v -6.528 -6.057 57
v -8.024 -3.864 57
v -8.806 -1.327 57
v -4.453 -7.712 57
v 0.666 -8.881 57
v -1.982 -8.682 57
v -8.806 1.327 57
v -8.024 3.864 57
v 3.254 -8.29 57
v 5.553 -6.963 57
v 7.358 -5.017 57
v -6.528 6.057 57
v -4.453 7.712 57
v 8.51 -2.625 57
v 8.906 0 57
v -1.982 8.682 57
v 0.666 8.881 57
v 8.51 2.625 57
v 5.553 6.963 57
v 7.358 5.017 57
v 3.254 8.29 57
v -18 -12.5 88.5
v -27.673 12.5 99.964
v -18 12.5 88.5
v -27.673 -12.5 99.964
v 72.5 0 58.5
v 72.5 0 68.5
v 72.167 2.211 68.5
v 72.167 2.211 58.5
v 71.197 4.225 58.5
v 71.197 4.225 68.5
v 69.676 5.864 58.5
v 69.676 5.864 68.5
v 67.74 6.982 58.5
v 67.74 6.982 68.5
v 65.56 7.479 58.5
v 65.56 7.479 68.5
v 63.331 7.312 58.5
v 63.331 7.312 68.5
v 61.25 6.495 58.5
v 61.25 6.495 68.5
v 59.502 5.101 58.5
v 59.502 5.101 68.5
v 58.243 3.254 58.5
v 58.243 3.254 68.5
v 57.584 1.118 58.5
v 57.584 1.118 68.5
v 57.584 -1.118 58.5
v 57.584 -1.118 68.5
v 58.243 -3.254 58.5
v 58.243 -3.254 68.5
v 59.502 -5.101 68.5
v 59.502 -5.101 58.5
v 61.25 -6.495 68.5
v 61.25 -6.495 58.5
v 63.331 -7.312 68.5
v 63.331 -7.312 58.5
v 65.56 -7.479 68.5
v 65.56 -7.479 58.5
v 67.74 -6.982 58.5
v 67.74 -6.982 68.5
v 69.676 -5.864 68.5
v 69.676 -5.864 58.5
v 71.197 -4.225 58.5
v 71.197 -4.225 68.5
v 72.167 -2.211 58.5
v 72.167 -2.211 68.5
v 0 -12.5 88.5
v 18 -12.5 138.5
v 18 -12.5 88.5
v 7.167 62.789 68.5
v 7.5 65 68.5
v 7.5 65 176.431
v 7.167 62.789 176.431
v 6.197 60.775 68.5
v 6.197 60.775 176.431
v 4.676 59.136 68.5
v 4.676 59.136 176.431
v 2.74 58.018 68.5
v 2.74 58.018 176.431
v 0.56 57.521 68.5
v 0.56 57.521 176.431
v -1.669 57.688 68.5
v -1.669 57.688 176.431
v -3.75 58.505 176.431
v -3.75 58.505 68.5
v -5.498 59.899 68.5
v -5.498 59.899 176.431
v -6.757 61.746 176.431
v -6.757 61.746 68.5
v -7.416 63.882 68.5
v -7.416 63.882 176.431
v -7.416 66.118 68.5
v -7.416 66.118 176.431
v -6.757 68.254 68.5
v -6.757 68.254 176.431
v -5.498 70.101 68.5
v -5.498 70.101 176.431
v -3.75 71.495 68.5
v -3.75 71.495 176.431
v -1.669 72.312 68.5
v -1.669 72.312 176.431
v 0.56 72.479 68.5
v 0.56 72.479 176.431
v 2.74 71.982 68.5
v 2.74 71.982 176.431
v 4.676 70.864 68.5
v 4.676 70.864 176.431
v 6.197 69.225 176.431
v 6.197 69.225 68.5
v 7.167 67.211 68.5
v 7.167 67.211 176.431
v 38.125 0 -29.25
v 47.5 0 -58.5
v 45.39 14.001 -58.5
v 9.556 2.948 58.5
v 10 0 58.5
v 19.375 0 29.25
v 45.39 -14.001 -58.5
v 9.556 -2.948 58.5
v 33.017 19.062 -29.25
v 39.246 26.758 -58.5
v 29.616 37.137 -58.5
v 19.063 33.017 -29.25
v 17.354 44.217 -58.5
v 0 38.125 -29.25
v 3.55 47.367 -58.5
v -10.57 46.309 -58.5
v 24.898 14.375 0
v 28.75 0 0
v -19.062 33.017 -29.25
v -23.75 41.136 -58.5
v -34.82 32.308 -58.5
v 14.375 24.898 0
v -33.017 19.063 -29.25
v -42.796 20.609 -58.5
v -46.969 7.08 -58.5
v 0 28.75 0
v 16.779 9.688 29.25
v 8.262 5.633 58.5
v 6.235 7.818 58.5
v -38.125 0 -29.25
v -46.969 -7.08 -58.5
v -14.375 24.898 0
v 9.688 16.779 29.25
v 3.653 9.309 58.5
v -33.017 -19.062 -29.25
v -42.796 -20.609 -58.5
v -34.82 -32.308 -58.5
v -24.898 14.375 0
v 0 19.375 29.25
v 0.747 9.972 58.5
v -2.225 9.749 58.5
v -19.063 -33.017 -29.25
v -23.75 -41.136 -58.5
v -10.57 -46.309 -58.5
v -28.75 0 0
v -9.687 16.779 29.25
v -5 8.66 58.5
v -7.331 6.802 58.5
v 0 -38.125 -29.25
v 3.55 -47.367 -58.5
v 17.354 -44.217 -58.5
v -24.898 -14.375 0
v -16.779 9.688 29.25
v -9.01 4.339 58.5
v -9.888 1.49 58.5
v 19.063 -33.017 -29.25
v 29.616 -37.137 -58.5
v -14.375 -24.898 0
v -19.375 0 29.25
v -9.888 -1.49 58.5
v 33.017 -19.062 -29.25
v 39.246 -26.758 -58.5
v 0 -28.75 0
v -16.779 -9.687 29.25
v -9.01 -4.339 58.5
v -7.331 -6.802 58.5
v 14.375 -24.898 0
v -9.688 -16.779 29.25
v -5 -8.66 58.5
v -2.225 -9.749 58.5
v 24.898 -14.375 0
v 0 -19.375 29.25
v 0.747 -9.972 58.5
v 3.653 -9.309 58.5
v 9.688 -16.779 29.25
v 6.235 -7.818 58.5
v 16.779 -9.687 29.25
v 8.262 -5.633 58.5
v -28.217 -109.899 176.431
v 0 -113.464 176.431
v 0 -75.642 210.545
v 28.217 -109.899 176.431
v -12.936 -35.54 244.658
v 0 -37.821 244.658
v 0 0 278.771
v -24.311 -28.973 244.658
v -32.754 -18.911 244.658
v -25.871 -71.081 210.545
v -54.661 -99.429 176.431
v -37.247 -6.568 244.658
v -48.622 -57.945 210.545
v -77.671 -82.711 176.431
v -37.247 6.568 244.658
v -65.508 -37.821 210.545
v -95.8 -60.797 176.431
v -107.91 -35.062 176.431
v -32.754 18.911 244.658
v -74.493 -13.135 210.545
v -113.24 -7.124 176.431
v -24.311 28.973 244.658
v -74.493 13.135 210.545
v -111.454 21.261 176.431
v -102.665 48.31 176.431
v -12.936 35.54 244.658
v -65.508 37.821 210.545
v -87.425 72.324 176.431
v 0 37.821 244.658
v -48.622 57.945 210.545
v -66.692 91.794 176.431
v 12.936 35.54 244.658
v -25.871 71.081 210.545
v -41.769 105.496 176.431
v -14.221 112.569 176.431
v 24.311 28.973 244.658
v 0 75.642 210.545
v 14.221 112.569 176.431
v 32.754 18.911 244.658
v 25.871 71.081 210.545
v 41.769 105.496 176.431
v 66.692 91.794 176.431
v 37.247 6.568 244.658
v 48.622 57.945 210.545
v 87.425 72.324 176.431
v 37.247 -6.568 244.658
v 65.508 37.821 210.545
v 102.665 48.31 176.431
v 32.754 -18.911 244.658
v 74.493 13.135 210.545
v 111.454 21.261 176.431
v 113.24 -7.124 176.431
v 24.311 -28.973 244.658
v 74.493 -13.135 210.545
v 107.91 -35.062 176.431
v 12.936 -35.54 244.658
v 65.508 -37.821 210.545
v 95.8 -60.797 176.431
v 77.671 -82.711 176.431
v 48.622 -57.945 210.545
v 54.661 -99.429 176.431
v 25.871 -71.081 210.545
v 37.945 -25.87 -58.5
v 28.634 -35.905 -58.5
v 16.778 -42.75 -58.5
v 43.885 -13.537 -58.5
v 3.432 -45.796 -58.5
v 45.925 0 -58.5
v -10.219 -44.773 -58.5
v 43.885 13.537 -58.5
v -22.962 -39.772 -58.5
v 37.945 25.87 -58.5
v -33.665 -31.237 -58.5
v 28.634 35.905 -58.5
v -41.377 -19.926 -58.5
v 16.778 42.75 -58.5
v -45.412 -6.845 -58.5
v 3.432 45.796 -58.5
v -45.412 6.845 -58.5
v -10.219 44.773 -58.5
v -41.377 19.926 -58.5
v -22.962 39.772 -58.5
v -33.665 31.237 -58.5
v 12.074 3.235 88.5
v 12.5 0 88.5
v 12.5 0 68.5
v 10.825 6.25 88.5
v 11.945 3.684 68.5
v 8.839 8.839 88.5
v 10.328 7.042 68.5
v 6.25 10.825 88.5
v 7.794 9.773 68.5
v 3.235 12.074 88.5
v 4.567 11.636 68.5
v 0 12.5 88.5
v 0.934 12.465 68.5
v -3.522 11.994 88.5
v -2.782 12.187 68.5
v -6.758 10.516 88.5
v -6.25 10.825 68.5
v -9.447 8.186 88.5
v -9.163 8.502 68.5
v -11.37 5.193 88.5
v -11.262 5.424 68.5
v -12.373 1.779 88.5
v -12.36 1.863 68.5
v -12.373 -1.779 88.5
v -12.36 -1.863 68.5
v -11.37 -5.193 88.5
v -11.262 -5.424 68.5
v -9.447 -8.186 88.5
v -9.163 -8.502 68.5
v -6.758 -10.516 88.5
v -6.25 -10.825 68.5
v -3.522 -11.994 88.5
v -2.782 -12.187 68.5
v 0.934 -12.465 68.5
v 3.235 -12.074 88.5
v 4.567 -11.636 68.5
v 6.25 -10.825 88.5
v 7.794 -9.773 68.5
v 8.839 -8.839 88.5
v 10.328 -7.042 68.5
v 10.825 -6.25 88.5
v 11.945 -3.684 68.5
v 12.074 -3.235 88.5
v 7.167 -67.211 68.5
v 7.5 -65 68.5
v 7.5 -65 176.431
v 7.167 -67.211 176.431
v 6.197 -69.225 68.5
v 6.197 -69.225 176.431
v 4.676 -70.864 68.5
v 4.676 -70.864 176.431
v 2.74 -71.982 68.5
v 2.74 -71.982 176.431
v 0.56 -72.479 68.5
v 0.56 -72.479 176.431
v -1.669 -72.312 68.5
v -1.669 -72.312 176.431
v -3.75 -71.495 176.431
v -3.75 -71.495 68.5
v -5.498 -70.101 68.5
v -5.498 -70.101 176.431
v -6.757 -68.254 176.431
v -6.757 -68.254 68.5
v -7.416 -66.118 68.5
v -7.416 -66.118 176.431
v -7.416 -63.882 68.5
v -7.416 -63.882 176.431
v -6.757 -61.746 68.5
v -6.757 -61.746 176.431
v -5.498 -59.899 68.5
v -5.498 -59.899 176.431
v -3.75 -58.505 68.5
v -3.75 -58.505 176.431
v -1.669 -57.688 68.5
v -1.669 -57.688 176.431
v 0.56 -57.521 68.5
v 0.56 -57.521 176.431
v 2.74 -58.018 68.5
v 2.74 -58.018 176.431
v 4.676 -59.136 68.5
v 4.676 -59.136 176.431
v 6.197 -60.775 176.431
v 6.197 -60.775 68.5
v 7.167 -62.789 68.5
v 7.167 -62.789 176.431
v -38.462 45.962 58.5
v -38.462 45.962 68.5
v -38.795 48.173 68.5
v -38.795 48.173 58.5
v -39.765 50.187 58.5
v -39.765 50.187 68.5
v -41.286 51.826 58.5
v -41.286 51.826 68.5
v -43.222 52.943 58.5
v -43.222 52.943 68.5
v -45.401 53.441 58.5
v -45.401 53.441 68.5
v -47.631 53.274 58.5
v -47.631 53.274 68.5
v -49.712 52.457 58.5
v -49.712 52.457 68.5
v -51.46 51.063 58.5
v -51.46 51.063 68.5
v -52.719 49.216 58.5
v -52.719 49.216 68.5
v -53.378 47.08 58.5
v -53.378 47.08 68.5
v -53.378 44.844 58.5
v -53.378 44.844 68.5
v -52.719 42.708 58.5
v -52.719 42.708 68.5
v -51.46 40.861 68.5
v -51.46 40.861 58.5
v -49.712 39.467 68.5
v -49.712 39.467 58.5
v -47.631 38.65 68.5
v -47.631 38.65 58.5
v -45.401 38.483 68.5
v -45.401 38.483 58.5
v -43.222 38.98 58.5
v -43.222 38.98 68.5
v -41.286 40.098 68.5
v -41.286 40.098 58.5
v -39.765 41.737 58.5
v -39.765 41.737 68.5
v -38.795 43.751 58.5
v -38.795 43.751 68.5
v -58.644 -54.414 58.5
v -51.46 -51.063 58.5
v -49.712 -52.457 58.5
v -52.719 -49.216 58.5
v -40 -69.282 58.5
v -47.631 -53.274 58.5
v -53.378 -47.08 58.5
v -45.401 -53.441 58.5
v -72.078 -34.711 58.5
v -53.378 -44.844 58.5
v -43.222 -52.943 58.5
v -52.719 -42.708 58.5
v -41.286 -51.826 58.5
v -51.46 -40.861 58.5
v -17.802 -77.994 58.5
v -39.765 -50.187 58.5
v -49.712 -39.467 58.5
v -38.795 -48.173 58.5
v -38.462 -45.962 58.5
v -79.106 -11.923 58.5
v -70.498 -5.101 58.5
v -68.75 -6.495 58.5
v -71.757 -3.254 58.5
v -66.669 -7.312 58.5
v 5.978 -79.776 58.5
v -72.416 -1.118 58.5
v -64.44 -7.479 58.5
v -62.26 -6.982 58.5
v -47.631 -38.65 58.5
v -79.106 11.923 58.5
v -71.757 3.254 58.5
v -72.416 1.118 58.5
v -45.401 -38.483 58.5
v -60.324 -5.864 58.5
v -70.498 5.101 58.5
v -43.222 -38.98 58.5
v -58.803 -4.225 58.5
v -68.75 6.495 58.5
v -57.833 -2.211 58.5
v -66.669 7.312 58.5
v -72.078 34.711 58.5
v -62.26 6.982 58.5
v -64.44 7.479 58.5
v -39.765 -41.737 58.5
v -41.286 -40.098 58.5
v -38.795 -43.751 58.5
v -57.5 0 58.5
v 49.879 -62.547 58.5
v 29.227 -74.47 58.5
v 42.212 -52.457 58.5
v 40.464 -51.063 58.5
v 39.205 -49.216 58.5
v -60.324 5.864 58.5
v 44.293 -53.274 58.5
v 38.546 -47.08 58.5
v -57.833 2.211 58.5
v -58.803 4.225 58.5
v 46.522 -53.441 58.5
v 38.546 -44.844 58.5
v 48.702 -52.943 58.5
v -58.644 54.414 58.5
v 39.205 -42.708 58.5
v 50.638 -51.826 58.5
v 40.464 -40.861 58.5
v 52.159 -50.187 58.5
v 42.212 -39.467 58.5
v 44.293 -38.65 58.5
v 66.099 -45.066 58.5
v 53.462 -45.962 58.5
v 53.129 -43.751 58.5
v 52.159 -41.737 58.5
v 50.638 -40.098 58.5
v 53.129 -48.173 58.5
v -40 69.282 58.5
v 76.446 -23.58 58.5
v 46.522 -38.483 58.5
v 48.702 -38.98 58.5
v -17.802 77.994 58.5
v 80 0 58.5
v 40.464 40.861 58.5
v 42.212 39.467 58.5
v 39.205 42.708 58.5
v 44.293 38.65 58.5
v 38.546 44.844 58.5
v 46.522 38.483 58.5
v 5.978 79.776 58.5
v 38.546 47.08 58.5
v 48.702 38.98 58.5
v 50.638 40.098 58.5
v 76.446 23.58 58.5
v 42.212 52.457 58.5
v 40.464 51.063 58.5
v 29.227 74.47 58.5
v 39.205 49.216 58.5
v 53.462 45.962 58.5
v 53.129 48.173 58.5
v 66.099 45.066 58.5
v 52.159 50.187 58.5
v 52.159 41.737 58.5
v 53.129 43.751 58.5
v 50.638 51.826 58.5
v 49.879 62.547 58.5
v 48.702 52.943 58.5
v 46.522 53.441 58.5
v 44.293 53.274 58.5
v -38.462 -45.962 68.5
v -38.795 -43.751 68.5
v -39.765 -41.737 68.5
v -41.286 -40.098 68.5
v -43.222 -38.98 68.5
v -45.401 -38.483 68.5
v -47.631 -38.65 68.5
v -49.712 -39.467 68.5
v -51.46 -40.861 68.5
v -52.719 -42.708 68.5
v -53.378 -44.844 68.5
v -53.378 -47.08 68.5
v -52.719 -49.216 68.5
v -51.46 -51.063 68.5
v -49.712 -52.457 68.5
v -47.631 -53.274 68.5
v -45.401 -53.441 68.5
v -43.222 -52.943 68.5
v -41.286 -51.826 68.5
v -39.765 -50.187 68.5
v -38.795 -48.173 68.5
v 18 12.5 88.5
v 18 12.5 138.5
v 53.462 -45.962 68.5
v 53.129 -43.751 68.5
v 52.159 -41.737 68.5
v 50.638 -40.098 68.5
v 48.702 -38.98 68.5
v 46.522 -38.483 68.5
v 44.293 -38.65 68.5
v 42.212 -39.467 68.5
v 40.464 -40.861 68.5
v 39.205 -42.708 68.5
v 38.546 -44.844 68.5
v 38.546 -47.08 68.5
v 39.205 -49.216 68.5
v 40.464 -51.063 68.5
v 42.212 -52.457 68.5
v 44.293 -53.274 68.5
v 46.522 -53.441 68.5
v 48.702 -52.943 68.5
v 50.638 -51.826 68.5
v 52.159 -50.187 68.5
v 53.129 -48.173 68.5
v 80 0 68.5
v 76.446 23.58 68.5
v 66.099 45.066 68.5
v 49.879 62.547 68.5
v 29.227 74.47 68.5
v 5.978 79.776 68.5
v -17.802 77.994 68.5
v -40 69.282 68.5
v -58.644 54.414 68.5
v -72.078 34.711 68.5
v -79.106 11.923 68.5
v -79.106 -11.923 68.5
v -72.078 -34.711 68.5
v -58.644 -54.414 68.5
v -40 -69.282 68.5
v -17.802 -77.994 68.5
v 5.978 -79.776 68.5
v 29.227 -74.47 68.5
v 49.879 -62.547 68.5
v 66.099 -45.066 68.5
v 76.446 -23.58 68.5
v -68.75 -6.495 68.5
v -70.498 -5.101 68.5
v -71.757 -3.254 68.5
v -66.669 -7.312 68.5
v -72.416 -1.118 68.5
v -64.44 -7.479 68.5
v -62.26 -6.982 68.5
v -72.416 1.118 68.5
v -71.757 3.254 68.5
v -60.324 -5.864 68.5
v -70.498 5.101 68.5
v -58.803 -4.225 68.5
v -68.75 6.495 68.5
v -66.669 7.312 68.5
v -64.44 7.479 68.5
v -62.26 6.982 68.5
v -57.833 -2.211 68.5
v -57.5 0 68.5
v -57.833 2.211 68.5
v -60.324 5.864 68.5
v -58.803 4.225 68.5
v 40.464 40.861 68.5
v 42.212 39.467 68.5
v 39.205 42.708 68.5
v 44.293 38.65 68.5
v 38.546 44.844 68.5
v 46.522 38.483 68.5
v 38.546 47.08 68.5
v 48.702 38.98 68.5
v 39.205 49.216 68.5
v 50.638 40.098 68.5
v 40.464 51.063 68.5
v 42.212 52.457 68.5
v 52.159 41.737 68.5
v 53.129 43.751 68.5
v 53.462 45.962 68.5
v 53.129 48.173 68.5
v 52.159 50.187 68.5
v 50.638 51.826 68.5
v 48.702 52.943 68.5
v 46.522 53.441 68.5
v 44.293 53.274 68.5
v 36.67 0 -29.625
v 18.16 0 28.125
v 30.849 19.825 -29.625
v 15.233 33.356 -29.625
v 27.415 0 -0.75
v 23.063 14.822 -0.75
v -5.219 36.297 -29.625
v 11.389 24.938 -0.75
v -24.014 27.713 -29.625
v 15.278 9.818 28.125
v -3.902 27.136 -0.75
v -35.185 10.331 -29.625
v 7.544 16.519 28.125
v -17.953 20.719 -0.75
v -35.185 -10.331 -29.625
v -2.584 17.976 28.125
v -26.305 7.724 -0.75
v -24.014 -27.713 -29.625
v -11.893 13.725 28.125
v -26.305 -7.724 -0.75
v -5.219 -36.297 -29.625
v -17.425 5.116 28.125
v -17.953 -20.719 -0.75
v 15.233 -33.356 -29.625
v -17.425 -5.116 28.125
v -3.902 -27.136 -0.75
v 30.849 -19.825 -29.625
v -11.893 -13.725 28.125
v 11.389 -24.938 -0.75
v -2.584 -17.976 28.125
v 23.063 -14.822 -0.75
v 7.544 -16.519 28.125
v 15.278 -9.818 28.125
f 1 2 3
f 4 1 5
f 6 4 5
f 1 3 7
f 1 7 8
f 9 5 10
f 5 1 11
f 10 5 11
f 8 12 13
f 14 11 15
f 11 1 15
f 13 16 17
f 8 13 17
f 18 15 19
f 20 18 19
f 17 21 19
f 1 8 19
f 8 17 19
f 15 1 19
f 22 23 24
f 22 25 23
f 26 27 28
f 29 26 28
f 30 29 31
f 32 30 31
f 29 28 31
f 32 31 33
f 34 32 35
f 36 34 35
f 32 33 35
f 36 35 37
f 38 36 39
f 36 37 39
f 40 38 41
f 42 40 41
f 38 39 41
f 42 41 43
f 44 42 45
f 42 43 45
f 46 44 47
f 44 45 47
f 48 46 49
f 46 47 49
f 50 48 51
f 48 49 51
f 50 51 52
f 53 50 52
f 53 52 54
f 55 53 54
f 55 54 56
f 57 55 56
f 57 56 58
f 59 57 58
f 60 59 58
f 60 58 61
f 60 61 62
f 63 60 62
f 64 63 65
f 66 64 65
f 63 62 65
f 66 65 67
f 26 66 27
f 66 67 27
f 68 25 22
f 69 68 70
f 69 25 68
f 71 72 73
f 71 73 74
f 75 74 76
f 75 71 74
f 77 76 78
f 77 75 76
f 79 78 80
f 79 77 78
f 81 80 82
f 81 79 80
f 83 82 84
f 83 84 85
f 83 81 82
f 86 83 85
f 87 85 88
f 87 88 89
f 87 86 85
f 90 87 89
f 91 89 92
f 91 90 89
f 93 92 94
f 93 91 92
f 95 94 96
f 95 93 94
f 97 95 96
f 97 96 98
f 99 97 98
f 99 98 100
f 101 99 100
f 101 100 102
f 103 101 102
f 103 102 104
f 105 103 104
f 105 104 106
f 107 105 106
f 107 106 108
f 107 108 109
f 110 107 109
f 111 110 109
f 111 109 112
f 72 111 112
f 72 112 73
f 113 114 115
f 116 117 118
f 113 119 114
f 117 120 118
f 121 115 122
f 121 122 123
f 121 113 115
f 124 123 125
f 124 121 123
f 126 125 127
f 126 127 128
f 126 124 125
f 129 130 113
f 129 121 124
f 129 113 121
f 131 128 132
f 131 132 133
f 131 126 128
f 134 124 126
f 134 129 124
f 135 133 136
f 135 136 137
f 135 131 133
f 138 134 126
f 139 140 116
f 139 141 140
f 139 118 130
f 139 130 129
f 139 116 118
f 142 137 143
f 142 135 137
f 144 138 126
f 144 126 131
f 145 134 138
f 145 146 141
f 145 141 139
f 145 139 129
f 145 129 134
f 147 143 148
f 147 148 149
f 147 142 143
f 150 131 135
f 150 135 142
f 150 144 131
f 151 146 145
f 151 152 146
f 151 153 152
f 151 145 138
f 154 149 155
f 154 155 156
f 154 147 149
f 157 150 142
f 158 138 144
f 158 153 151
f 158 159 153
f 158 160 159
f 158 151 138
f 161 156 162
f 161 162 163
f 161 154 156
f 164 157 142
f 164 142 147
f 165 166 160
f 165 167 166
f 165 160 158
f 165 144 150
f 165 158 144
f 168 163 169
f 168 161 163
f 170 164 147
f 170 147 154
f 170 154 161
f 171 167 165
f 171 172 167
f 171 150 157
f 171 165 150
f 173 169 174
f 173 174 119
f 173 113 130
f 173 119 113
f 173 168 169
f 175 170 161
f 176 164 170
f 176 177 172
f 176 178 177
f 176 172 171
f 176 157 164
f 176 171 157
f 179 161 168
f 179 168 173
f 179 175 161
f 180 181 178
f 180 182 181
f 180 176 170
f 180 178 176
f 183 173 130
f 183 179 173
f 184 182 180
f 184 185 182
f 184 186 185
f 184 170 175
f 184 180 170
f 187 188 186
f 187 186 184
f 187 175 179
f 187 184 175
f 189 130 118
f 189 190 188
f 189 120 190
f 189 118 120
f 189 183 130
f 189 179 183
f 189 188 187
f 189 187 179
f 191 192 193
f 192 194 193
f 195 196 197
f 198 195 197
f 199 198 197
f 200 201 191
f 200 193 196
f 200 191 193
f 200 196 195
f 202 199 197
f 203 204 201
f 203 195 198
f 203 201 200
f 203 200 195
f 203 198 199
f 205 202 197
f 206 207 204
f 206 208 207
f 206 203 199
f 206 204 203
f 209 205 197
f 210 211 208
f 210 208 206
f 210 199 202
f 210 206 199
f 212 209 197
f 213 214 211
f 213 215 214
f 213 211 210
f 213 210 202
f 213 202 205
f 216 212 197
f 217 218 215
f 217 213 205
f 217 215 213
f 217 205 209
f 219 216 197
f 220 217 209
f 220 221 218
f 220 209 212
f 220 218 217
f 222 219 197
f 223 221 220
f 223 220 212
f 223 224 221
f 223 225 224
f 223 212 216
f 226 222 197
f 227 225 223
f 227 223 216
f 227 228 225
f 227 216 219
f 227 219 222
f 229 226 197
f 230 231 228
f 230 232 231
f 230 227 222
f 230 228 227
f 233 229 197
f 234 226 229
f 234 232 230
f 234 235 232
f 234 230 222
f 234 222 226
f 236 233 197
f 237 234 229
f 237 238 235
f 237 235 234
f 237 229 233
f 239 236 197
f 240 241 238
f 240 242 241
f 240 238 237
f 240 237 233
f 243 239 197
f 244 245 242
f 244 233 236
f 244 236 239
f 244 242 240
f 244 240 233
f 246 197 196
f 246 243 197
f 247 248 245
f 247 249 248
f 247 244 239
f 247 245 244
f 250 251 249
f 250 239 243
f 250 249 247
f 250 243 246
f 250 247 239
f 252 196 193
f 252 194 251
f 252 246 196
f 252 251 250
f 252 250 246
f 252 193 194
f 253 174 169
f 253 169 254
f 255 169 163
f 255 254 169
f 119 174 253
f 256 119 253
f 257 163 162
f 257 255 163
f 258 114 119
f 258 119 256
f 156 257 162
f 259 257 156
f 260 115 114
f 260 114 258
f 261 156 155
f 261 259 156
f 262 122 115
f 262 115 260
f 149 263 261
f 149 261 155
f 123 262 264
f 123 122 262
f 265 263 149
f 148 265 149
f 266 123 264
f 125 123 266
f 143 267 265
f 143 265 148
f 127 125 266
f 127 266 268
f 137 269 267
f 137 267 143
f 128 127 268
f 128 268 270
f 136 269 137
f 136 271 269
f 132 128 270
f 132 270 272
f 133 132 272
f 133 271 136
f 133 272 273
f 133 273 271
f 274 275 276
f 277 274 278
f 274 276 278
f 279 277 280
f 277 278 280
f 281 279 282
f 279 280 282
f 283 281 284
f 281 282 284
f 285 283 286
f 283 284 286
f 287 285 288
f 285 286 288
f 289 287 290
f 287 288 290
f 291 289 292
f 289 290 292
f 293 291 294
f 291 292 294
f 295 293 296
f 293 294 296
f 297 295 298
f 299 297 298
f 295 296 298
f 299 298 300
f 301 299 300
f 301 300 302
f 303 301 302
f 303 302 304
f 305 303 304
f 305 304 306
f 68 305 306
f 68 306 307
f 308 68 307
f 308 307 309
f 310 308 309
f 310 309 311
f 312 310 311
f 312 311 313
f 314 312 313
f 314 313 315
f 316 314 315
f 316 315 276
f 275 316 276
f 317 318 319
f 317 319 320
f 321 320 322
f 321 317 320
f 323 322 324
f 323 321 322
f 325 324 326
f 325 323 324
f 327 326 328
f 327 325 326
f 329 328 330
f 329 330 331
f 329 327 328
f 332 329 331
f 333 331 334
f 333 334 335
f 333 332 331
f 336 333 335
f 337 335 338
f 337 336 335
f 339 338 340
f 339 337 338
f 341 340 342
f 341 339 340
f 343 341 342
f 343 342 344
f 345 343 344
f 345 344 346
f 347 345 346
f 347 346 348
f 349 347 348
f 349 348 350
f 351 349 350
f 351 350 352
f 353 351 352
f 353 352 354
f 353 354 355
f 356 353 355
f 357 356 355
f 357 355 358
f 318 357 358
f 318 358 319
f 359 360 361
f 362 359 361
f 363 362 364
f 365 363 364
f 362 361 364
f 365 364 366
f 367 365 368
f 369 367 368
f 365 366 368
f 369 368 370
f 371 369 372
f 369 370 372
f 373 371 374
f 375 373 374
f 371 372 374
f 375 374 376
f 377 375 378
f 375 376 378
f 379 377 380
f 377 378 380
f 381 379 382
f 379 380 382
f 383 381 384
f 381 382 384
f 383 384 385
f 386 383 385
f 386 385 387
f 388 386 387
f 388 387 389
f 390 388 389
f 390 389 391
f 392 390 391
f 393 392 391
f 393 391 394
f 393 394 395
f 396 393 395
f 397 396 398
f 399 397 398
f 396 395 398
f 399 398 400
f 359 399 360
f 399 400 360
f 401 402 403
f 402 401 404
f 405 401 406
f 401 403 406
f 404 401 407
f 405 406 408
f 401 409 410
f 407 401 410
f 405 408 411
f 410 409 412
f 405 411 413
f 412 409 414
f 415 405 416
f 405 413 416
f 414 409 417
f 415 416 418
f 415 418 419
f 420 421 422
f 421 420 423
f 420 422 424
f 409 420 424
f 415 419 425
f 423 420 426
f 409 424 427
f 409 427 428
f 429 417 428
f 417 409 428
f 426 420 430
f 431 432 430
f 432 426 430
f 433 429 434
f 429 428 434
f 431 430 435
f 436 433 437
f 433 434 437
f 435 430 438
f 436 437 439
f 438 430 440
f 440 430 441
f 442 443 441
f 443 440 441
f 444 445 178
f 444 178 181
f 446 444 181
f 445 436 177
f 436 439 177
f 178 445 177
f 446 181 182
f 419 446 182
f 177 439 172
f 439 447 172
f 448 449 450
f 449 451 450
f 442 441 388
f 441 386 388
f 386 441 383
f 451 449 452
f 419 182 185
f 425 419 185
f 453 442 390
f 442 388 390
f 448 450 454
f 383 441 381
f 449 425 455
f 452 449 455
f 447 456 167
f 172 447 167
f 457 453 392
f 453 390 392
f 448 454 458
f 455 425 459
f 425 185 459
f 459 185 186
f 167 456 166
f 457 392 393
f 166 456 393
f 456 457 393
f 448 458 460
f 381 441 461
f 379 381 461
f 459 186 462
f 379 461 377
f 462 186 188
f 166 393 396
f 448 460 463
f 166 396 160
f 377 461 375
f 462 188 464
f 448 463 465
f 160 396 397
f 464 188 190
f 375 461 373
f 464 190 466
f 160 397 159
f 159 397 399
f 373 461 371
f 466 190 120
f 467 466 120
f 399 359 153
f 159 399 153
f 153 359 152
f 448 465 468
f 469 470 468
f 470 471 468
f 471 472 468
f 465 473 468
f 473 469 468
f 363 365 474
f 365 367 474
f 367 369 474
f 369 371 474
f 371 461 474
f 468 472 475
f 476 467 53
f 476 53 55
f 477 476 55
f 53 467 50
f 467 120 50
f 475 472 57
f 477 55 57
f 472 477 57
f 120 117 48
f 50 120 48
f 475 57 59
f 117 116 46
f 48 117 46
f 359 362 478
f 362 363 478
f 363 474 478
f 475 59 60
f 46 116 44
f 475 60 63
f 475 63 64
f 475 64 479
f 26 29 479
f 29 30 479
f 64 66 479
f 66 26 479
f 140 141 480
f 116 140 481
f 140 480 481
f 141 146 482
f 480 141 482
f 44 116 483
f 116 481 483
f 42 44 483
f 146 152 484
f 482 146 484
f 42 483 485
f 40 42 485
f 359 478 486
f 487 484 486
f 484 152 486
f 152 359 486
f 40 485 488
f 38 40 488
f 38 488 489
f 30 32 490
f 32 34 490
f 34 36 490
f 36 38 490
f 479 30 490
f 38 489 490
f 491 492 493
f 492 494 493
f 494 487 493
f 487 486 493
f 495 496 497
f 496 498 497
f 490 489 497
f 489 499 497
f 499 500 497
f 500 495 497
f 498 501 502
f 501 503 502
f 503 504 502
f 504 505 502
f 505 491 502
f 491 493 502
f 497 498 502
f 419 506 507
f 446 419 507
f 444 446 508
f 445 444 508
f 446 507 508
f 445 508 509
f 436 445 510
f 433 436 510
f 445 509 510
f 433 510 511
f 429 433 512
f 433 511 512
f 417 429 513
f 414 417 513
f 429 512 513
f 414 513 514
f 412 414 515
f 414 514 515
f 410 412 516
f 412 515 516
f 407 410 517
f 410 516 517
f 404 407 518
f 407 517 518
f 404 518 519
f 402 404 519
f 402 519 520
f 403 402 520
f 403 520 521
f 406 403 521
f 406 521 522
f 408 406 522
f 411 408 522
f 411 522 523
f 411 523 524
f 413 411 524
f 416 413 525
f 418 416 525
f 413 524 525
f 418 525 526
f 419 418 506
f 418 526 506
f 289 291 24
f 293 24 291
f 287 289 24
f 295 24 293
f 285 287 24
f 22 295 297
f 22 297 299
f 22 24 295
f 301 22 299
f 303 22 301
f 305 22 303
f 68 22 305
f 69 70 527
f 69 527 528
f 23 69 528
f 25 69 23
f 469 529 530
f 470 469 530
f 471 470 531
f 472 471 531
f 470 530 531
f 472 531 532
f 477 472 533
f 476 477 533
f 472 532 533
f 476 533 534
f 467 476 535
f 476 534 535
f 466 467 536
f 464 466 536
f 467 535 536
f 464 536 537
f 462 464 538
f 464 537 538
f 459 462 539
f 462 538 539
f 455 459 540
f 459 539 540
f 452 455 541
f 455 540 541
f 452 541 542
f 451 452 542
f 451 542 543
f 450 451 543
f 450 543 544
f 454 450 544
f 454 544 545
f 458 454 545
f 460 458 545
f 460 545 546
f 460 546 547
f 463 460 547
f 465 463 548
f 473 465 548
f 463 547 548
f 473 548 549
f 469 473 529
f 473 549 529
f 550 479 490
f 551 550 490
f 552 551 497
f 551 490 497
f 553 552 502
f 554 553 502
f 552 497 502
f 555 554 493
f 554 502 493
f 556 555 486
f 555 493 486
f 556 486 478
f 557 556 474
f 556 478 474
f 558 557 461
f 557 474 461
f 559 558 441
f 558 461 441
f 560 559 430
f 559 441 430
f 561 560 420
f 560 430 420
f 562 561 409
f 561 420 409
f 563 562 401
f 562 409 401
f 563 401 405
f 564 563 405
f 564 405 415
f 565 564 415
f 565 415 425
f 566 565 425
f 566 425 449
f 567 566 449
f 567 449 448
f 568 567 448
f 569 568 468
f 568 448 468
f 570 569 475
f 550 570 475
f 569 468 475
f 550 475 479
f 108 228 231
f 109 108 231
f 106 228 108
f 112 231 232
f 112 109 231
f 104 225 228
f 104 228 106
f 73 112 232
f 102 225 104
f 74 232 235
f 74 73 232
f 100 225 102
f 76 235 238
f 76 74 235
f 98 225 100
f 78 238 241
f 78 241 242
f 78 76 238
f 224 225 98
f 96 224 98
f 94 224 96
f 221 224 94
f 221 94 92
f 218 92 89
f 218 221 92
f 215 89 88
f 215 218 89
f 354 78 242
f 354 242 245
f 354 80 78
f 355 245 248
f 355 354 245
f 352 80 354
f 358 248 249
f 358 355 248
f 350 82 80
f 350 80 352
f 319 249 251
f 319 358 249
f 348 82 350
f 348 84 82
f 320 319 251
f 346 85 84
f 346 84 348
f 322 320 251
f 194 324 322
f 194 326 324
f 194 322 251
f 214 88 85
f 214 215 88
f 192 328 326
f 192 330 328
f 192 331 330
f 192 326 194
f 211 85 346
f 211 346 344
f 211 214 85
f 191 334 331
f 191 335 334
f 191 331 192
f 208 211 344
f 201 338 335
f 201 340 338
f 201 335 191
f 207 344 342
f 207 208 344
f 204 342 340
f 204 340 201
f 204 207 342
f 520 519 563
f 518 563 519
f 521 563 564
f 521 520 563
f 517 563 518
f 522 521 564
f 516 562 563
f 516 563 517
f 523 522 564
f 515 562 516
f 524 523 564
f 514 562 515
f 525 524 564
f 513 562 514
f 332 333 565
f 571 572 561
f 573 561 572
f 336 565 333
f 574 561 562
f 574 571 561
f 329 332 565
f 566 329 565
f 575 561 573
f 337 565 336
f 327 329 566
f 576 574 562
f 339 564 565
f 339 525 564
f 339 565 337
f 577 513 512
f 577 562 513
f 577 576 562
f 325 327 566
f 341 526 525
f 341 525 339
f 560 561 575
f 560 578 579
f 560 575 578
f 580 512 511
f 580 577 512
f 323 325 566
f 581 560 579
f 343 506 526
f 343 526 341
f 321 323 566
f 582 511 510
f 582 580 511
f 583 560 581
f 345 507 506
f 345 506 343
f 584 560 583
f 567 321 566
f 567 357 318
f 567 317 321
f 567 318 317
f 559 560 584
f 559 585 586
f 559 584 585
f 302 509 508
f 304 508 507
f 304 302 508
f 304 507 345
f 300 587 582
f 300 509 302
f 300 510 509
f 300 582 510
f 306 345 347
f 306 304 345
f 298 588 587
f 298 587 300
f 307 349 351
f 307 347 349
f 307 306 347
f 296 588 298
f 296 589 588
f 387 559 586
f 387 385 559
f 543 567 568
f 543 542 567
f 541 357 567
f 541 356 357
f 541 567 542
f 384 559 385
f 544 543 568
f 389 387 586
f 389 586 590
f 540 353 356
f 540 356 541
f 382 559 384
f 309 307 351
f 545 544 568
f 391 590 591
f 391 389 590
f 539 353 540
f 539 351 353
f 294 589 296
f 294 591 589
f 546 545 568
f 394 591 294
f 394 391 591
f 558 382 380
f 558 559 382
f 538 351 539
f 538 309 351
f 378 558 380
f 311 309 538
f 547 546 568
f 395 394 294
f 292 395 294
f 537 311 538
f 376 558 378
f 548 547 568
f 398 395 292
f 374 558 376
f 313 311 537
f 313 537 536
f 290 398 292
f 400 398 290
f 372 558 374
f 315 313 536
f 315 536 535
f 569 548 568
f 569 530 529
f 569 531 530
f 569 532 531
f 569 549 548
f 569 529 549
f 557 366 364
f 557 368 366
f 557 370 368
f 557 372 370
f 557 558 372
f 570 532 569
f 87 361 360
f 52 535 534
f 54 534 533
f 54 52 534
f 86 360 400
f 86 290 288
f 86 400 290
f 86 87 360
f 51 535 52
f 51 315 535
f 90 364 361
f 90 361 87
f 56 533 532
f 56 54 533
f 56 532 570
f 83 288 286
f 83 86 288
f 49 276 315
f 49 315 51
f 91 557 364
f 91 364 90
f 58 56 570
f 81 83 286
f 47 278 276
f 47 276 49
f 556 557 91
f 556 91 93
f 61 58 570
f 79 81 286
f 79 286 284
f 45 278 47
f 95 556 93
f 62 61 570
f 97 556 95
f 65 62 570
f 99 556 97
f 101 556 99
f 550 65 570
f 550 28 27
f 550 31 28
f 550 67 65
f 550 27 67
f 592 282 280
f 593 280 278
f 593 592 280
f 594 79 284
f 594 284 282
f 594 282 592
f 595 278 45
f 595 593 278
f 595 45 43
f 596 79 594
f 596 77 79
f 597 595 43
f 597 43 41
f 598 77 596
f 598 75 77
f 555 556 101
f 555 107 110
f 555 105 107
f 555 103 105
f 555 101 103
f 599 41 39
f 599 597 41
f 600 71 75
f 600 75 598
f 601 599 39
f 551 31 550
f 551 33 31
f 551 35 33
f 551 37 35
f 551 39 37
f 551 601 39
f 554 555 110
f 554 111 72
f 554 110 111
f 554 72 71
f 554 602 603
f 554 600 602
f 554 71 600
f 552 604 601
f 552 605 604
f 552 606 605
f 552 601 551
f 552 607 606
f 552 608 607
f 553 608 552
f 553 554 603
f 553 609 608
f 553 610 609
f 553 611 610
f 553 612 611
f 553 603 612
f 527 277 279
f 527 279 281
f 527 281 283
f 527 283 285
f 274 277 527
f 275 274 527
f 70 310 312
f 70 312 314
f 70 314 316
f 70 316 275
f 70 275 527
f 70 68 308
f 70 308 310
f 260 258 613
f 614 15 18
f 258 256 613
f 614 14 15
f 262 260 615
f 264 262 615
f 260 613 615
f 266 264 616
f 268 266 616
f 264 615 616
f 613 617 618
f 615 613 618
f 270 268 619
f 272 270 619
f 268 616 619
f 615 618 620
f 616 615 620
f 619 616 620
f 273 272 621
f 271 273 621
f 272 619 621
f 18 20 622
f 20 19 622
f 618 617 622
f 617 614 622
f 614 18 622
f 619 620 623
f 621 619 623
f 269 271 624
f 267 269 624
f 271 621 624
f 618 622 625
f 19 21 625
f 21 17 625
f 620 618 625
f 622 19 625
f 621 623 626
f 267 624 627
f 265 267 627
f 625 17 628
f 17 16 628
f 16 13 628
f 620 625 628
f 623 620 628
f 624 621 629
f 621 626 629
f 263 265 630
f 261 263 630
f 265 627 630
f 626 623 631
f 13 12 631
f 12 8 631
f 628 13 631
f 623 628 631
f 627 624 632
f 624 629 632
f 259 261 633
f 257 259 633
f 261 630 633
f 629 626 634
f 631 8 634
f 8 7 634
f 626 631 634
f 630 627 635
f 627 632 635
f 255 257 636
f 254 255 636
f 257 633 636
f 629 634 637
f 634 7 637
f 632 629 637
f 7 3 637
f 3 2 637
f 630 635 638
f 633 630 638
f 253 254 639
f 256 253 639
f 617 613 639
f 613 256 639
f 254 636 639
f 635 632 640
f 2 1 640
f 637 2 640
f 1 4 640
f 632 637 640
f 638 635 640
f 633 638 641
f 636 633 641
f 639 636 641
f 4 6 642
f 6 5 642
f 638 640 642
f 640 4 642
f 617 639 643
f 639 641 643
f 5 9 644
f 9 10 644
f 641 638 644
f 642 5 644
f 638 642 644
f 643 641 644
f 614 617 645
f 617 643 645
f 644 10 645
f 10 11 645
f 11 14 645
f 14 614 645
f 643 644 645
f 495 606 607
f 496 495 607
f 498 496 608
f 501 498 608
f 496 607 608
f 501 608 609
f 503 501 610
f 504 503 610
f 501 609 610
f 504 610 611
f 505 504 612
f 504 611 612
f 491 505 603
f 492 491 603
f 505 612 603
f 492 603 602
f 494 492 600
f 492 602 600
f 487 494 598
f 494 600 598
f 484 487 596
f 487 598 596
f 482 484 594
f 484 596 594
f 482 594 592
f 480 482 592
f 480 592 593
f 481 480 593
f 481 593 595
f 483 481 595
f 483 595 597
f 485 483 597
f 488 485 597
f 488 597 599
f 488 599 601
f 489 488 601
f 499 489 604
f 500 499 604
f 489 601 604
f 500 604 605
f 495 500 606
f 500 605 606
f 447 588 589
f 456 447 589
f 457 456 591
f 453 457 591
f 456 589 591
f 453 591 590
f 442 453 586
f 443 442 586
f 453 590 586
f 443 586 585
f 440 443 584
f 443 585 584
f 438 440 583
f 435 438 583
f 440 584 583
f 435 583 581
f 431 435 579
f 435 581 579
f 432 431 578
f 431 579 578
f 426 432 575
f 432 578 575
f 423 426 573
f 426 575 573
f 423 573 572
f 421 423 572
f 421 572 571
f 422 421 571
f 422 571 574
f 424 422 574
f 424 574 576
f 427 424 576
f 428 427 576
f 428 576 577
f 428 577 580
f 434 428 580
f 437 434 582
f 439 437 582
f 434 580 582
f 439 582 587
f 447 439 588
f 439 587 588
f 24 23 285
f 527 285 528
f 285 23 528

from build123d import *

# Parameters (mm, degrees)
F2_T      = -1.5
F3_R      = 80
F4_DEPTH  = 10
F5_R      = 7.5
F6_DEPTH  = 10
F7_R      = 12.5
F8_DEPTH  = 20
F10_DEPTH = 12.5
F11_R     = 7.5
F12_DEPTH = 150


with BuildPart() as f1:
    # F0 (on Front) → F1 (revolve)
    with BuildSketch(Plane.XZ):
        Polygon((10, 58.5), (0, 58.5), (0, -58.5), (47.5, -58.5), align=None)
    revolve(axis=Axis((0, 0, 0), (0, 0, 1)))

    # F2
    f2_openings = [f1.faces().sort_by_distance(p)[0] for p in [
        (0, 0, -58.5),
    ]]
    offset(amount=F2_T, openings=f2_openings)

    # F3 (on face) → F4 (join)
    with BuildSketch(Plane.XY.offset(58.5)):
        Circle(F3_R)
    extrude(amount=F4_DEPTH)

    # F5 (on face) → F6 (cut, through all)
    with BuildSketch(Plane.XY.offset(68.5)):
        with Locations((-65, 0)):
            Circle(F5_R)
        with Locations((-45.961941, -45.961941)):
            Circle(F5_R)
        with Locations((0, -65)):
            Circle(F5_R)
        with Locations((45.961941, -45.961941)):
            Circle(F5_R)
        with Locations((65, 0)):
            Circle(F5_R)
        with Locations((45.961941, 45.961941)):
            Circle(F5_R)
        with Locations((0, 65)):
            Circle(F5_R)
        with Locations((-45.961941, 45.961941)):
            Circle(F5_R)
    extrude(amount=-F6_DEPTH, mode=Mode.SUBTRACT)

    # F7 (on face) → F8 (join)
    with BuildSketch(Plane.XY.offset(68.5)):
        Circle(F7_R)
    extrude(amount=F8_DEPTH)

    # F9 (on Front) → F10 (join, symmetric)
    with BuildSketch(Plane.XZ):
        Polygon((-27.672915, 99.964498), (-18, 88.5), (18, 88.5), (18, 138.5), align=None)
    extrude(amount=F10_DEPTH, both=True)

    # F11 (on face) → F12 (join)
    with BuildSketch(Plane(origin=(0, 0, 58.5), x_dir=(1, 0, 0), z_dir=(0, 0, -1))):
        with Locations((0, -65)):
            Circle(F11_R)
        with Locations((0, 65)):
            Circle(F11_R)
    extrude(amount=-F12_DEPTH)

    # F13 (on Right) → F14 (revolve)
    with BuildSketch(Plane.YZ):
        Polygon((0, 278.771132), (-113.463566, 176.431447), (0, 176.431447), align=None)
    revolve(axis=Axis((0, 0, 227.60129), (0, 0, -1)))


solid = f1.part
